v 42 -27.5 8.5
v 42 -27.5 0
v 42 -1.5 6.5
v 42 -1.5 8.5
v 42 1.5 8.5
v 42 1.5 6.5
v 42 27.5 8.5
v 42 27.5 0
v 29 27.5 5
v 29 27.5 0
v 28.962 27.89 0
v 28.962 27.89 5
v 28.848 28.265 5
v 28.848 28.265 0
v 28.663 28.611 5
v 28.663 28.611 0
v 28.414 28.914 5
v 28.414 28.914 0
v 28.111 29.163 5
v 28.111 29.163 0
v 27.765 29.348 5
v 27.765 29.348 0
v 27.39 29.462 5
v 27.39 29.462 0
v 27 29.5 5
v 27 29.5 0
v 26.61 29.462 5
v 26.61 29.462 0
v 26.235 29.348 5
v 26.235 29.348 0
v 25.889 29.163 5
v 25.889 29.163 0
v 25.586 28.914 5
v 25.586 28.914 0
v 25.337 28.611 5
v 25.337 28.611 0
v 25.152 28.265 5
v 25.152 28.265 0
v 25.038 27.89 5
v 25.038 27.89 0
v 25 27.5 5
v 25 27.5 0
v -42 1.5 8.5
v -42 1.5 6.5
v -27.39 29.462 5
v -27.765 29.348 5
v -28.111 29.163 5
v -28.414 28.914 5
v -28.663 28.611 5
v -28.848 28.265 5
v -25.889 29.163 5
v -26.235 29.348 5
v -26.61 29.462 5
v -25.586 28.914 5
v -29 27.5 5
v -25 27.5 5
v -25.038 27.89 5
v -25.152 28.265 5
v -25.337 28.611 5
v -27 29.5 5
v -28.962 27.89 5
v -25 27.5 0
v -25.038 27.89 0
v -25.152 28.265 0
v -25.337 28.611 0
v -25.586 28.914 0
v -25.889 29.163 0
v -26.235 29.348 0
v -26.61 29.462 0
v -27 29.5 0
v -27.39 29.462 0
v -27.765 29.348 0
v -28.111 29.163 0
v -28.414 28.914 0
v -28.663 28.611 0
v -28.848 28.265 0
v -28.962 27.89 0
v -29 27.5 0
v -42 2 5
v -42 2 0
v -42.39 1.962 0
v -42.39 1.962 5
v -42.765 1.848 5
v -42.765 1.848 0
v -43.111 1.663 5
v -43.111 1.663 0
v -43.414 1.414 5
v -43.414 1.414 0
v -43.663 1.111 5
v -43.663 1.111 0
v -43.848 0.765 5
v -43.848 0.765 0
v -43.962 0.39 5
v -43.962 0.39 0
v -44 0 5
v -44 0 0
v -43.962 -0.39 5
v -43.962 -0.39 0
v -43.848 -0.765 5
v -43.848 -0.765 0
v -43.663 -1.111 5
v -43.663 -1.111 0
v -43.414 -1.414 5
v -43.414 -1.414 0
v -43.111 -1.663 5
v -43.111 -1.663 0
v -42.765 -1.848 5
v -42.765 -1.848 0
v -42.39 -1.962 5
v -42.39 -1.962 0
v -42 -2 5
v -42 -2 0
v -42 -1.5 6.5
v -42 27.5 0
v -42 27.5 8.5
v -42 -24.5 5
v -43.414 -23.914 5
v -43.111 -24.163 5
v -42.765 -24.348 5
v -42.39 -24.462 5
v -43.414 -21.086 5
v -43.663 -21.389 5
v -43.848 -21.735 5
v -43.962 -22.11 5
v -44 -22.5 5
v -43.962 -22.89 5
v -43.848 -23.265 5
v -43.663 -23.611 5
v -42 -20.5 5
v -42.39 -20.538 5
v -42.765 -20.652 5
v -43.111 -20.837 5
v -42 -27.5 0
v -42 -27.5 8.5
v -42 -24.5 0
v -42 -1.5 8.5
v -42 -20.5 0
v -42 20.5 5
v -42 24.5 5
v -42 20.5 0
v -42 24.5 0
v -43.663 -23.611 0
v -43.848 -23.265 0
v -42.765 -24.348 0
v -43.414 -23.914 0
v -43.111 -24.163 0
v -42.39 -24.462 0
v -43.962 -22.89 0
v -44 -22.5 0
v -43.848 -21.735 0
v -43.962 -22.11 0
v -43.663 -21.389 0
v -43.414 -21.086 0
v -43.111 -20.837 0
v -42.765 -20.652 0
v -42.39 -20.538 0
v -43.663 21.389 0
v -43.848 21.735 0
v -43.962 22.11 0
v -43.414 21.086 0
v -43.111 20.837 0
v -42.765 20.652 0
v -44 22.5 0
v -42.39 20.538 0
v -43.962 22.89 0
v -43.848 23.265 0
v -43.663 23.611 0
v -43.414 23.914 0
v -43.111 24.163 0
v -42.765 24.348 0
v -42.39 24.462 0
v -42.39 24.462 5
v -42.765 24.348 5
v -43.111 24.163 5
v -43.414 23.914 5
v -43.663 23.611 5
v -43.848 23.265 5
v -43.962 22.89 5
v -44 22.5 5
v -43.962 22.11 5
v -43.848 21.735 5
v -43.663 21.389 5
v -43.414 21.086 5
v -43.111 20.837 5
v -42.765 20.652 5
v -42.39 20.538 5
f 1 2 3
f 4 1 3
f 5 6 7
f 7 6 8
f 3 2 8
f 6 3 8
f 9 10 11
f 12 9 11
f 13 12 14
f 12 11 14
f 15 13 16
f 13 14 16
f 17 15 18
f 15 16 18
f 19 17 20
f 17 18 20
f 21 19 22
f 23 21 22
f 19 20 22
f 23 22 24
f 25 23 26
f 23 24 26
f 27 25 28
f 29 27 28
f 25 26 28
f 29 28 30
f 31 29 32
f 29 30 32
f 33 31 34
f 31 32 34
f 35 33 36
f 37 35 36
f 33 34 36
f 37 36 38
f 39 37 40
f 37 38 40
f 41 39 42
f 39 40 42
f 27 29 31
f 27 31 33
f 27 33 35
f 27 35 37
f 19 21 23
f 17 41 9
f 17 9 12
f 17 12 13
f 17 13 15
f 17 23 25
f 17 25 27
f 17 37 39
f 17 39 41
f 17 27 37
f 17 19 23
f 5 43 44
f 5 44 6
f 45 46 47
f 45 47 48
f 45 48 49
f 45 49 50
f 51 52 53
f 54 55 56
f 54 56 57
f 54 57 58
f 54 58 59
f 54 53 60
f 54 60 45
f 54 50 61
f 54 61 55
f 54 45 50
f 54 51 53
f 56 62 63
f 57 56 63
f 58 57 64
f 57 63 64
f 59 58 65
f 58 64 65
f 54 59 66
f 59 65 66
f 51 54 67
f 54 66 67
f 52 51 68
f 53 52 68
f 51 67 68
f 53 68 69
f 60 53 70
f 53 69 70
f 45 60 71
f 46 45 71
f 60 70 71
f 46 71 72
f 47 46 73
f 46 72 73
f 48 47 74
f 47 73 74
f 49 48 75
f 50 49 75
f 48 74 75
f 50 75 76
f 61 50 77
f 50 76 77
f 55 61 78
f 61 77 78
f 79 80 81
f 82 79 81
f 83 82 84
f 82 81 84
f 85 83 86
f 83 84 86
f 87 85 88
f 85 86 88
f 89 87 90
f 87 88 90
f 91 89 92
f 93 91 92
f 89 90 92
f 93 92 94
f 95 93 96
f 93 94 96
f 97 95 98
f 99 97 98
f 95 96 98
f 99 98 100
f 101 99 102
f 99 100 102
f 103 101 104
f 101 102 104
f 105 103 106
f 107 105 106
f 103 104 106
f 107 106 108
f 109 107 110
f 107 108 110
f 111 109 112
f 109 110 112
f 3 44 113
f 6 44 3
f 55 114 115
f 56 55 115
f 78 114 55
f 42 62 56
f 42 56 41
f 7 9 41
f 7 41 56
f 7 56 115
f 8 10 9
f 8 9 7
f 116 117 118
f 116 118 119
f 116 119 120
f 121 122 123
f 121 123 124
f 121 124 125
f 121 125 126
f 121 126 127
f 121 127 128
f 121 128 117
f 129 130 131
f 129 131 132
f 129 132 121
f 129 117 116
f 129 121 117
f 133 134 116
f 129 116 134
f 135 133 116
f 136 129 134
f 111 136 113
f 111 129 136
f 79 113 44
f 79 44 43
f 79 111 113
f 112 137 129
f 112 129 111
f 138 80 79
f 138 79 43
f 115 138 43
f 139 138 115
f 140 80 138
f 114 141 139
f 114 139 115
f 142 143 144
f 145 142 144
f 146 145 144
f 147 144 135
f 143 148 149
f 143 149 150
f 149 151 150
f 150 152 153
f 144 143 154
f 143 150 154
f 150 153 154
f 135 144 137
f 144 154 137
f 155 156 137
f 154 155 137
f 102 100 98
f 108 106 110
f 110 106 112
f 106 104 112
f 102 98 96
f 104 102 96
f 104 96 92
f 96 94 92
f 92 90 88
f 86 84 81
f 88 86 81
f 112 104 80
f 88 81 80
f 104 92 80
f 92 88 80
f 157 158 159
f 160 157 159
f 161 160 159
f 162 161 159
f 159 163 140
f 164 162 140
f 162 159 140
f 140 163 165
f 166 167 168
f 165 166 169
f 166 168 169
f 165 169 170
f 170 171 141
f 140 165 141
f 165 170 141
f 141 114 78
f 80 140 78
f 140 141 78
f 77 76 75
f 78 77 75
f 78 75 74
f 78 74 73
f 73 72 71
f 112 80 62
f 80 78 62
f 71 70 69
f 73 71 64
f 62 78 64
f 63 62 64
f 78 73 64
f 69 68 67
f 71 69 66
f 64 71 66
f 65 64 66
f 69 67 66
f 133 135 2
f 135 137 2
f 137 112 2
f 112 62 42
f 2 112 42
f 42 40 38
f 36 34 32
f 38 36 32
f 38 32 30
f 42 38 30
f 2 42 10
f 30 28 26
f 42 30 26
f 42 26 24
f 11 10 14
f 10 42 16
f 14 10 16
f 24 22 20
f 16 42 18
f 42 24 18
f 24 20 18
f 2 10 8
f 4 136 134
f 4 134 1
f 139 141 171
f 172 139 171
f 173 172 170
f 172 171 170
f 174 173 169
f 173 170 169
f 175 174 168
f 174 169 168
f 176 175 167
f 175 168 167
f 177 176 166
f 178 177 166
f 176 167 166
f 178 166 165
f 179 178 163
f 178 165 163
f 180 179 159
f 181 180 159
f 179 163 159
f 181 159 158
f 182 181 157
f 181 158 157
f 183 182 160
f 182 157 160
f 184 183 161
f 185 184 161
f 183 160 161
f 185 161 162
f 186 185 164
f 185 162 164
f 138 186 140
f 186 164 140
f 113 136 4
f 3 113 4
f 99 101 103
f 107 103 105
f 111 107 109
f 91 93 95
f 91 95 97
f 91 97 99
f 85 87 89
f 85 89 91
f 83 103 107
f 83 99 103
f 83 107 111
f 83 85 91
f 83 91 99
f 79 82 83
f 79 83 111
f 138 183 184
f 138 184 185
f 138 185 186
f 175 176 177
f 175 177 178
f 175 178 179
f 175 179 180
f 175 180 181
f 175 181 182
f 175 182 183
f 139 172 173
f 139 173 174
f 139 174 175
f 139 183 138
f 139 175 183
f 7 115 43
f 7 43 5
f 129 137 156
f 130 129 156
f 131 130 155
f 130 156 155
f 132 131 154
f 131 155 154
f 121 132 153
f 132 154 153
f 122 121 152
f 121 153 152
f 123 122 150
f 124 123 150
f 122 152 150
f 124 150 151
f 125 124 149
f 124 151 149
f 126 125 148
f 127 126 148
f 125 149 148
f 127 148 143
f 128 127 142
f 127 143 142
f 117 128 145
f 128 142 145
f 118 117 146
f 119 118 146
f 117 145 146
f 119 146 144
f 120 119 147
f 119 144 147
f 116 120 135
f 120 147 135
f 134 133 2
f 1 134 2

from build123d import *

# Parameters (mm, degrees)
EXTRUDE_2_DEPTH     = 8.5
EXTRUDE_3_DEPTH     = 5
SKETCH_2_W          = 84
SKETCH_2_H          = 3
CUT_EXTRUDE_1_DEPTH = 2


with BuildPart() as part:
    # ｽｹｯﾁ1 → ﾎﾞｽ - 押し出し2 (new body)
    with BuildSketch(Plane.XY):
        Polygon((-42, -27.5), (42, -27.5), (42, 27.5), (29, 27.5), (25, 27.5), (-25, 27.5), (-29, 27.5), (-42, 27.5), (-42, 24.5), (-42, 20.5), (-42, 2), (-42, -2), (-42, -20.5), (-42, -24.5), align=None)
    extrude(amount=EXTRUDE_2_DEPTH)

    # ｽｹｯﾁ1<3> → ﾎﾞｽ - 押し出し3 (add)
    with BuildSketch(Plane.XY):
        with BuildLine():
            ThreePointArc((-42, -20.5), (-44, -22.5), (-42, -24.5))
            Line((-42, -24.5), (-42, -20.5))
        make_face()
        with BuildLine():
            Line((25, 27.5), (29, 27.5))
            ThreePointArc((29, 27.5), (27, 29.5), (25, 27.5))
        make_face()
        with BuildLine():
            ThreePointArc((-42, 2), (-44, 0), (-42, -2))
            Line((-42, -2), (-42, 2))
        make_face()
        with BuildLine():
            Line((-29, 27.5), (-25, 27.5))
            ThreePointArc((-25, 27.5), (-27, 29.5), (-29, 27.5))
        make_face()
        with BuildLine():
            ThreePointArc((-42, 24.5), (-44, 22.5), (-42, 20.5))
            Line((-42, 20.5), (-42, 24.5))
        make_face()
    extrude(amount=EXTRUDE_3_DEPTH)

    # ｽｹｯﾁ2 → ｶｯﾄ - 押し出し1 (cut)
    with BuildSketch(Plane.XY.offset(8.5)):
        Rectangle(SKETCH_2_W, SKETCH_2_H)
    extrude(amount=-CUT_EXTRUDE_1_DEPTH, mode=Mode.SUBTRACT)


solid = part.part
